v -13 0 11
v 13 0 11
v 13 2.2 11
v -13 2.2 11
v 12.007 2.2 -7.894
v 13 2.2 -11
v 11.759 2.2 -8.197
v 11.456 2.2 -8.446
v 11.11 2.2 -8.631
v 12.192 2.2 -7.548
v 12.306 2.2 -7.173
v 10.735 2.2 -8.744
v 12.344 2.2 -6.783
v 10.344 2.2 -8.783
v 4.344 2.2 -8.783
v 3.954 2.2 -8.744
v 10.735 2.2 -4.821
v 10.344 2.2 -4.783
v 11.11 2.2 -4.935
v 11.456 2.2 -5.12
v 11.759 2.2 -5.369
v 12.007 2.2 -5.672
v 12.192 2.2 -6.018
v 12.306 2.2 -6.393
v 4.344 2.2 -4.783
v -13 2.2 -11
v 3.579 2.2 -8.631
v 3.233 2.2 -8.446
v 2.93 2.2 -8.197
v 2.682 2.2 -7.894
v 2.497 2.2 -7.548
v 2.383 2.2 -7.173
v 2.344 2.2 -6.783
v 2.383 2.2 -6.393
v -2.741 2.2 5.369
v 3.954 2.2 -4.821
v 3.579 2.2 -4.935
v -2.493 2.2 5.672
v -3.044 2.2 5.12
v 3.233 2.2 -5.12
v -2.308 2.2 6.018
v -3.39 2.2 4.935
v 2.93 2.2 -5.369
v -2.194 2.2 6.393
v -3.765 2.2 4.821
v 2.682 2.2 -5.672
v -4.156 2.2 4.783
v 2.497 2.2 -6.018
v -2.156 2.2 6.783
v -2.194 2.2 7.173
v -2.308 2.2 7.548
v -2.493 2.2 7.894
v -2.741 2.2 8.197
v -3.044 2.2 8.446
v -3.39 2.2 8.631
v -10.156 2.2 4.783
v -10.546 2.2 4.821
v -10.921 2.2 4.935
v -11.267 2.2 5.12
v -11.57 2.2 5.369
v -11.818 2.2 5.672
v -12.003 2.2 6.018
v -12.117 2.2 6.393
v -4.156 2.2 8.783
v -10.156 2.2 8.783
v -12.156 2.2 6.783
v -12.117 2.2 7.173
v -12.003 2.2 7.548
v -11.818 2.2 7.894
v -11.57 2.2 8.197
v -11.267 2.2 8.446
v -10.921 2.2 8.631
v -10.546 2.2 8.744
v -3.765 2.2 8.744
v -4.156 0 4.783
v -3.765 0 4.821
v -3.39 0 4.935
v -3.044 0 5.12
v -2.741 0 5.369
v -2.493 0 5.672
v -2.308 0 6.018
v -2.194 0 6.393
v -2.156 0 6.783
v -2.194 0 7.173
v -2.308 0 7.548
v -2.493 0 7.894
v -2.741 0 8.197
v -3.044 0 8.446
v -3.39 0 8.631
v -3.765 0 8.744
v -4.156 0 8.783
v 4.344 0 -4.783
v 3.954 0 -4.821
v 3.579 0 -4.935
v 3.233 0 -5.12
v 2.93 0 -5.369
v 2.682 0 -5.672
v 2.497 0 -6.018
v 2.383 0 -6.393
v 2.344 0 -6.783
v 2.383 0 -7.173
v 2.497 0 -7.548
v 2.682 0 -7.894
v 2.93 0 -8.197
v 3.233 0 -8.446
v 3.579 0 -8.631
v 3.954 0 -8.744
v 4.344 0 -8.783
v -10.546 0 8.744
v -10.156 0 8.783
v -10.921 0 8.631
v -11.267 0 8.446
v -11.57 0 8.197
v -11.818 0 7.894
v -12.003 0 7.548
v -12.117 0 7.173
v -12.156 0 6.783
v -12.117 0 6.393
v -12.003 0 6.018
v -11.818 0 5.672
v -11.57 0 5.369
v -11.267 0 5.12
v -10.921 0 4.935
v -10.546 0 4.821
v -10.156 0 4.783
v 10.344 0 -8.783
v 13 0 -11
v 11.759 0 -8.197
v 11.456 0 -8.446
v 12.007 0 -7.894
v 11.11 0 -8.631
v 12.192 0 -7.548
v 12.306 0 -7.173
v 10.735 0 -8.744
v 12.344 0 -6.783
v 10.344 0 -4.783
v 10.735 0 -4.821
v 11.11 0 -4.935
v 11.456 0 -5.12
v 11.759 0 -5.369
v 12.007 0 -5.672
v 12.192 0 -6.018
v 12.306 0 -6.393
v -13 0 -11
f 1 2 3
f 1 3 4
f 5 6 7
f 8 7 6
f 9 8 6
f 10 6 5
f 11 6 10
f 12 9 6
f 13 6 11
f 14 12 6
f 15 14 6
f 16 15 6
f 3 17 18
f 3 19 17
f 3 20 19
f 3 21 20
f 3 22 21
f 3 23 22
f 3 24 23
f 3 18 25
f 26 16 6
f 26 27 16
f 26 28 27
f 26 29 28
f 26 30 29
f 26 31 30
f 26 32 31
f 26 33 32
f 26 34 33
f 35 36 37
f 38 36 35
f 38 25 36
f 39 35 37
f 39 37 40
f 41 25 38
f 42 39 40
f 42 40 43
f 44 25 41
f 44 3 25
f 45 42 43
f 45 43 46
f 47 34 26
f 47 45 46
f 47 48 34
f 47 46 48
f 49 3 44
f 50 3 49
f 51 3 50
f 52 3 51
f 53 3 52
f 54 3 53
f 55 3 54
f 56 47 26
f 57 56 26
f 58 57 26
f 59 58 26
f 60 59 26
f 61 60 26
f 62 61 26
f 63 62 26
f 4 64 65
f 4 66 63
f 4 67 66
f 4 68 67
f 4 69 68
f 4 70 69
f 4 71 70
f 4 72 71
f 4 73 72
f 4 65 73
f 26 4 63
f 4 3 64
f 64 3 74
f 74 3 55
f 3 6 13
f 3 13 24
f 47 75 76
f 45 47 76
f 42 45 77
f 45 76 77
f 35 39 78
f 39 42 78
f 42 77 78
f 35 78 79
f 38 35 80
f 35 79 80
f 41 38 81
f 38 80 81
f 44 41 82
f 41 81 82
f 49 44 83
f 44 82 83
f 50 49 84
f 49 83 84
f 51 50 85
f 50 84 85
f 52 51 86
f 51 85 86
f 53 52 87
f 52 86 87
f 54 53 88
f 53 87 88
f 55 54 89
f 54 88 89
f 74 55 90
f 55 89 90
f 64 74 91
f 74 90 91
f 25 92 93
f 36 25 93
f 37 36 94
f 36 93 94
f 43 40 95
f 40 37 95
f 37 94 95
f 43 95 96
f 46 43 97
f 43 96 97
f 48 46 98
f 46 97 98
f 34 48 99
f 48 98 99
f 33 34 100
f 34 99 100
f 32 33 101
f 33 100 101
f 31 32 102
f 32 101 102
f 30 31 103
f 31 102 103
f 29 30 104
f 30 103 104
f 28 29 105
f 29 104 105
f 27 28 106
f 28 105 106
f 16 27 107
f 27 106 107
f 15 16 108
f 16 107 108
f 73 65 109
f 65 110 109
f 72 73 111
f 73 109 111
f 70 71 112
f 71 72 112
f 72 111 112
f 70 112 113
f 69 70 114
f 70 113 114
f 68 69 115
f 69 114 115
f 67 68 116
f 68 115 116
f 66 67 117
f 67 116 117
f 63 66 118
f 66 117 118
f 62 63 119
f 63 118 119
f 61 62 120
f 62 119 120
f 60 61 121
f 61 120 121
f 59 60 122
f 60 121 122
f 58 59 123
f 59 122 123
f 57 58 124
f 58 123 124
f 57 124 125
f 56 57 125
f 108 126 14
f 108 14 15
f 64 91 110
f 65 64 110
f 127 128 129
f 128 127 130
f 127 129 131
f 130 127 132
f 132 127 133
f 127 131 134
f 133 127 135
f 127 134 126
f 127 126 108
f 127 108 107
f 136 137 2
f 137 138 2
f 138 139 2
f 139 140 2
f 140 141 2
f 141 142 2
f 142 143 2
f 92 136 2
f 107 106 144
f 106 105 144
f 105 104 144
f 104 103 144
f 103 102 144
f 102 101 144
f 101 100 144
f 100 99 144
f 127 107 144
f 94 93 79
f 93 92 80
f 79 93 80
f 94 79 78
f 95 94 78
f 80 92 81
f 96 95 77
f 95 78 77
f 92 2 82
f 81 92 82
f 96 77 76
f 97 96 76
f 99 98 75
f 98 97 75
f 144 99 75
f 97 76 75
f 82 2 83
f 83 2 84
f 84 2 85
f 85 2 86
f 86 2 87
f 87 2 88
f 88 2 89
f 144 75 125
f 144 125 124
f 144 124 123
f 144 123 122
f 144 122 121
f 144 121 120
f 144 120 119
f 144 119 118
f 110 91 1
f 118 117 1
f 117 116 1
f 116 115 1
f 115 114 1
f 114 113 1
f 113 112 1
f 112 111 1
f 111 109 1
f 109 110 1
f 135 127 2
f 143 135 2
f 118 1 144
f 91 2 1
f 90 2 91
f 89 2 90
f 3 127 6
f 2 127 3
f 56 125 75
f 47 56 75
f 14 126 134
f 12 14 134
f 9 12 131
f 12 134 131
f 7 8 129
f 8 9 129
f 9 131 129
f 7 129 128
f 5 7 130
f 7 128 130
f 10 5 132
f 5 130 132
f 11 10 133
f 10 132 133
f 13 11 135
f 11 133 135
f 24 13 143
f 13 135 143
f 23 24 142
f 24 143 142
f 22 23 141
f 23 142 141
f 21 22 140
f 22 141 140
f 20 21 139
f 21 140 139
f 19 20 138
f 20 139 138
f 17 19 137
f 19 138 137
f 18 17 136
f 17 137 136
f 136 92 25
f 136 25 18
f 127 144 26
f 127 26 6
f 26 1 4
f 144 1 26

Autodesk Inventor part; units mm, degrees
ref_plane "YZ Plane" through (0, 0, 0) normal (1, 0, 0) x (0, 1, 0)
ref_plane "XZ Plane" through (0, 0, 0) normal (0, 1, 0) x (-1, 0, 0)
ref_plane "XY Plane" through (0, 0, 0) normal (0, 0, 1) x (1, 0, 0)
sketch "Sketch1" plane through (0, 0, 0) normal (0, 1, 0) x (-1, 0, 0)
  line L0 (-13, 11) -> (13, 11)
  line L1 (13, 11) -> (13, -11)
  line L2 (13, -11) -> (-13, -11)
  line L3 (-13, -11) -> (-13, 11)
  line L4 (-13, 11) -> (13, -11) construction
  line L5 (-4.3445, -6.7829) -> (-10.3445, -6.7829) construction
  line L6 (-4.3445, -4.7829) -> (-10.3445, -4.7829)
  line L7 (-10.3445, -8.7829) -> (-4.3445, -8.7829)
  arc A0 (-4.3445, -8.7829) -> (-4.3445, -4.7829) centre (-4.3445, -6.7829) ccw
  arc A1 (-10.3445, -4.7829) -> (-10.3445, -8.7829) centre (-10.3445, -6.7829) ccw
  line L8 (0, 0) -> (1.6306, 0)
  line L9 (0, 0) -> (1.2871, 0)
  line L10 (10.1555, 6.7829) -> (4.1555, 6.7829) construction
  line L11 (10.1555, 4.7829) -> (4.1555, 4.7829)
  line L12 (4.1555, 8.7829) -> (10.1555, 8.7829)
  arc A2 (10.1555, 4.7829) -> (10.1555, 8.7829) centre (10.1555, 6.7829) ccw
  arc A3 (4.1555, 8.7829) -> (4.1555, 4.7829) centre (4.1555, 6.7829) ccw
  point P0 (-7.3445, -6.7829)
  point P1 (7.1555, 6.7829)
  dimension "d0" = 26
  dimension "d1" = 22
  dimension "d5" = 6
  dimension "d6" = 4
  dimension "d19" = 6
  dimension "d20" = 4
  dimension "d21" = 14.5
extrude "Extrusion1" add sketch "Sketch1" along normal blind 2.2
ref_plane "Work Plane1" through (-13, 0, 0) normal (0, 0, 1) x (1, 0, 0)
properties part number "riser1.7mm"
